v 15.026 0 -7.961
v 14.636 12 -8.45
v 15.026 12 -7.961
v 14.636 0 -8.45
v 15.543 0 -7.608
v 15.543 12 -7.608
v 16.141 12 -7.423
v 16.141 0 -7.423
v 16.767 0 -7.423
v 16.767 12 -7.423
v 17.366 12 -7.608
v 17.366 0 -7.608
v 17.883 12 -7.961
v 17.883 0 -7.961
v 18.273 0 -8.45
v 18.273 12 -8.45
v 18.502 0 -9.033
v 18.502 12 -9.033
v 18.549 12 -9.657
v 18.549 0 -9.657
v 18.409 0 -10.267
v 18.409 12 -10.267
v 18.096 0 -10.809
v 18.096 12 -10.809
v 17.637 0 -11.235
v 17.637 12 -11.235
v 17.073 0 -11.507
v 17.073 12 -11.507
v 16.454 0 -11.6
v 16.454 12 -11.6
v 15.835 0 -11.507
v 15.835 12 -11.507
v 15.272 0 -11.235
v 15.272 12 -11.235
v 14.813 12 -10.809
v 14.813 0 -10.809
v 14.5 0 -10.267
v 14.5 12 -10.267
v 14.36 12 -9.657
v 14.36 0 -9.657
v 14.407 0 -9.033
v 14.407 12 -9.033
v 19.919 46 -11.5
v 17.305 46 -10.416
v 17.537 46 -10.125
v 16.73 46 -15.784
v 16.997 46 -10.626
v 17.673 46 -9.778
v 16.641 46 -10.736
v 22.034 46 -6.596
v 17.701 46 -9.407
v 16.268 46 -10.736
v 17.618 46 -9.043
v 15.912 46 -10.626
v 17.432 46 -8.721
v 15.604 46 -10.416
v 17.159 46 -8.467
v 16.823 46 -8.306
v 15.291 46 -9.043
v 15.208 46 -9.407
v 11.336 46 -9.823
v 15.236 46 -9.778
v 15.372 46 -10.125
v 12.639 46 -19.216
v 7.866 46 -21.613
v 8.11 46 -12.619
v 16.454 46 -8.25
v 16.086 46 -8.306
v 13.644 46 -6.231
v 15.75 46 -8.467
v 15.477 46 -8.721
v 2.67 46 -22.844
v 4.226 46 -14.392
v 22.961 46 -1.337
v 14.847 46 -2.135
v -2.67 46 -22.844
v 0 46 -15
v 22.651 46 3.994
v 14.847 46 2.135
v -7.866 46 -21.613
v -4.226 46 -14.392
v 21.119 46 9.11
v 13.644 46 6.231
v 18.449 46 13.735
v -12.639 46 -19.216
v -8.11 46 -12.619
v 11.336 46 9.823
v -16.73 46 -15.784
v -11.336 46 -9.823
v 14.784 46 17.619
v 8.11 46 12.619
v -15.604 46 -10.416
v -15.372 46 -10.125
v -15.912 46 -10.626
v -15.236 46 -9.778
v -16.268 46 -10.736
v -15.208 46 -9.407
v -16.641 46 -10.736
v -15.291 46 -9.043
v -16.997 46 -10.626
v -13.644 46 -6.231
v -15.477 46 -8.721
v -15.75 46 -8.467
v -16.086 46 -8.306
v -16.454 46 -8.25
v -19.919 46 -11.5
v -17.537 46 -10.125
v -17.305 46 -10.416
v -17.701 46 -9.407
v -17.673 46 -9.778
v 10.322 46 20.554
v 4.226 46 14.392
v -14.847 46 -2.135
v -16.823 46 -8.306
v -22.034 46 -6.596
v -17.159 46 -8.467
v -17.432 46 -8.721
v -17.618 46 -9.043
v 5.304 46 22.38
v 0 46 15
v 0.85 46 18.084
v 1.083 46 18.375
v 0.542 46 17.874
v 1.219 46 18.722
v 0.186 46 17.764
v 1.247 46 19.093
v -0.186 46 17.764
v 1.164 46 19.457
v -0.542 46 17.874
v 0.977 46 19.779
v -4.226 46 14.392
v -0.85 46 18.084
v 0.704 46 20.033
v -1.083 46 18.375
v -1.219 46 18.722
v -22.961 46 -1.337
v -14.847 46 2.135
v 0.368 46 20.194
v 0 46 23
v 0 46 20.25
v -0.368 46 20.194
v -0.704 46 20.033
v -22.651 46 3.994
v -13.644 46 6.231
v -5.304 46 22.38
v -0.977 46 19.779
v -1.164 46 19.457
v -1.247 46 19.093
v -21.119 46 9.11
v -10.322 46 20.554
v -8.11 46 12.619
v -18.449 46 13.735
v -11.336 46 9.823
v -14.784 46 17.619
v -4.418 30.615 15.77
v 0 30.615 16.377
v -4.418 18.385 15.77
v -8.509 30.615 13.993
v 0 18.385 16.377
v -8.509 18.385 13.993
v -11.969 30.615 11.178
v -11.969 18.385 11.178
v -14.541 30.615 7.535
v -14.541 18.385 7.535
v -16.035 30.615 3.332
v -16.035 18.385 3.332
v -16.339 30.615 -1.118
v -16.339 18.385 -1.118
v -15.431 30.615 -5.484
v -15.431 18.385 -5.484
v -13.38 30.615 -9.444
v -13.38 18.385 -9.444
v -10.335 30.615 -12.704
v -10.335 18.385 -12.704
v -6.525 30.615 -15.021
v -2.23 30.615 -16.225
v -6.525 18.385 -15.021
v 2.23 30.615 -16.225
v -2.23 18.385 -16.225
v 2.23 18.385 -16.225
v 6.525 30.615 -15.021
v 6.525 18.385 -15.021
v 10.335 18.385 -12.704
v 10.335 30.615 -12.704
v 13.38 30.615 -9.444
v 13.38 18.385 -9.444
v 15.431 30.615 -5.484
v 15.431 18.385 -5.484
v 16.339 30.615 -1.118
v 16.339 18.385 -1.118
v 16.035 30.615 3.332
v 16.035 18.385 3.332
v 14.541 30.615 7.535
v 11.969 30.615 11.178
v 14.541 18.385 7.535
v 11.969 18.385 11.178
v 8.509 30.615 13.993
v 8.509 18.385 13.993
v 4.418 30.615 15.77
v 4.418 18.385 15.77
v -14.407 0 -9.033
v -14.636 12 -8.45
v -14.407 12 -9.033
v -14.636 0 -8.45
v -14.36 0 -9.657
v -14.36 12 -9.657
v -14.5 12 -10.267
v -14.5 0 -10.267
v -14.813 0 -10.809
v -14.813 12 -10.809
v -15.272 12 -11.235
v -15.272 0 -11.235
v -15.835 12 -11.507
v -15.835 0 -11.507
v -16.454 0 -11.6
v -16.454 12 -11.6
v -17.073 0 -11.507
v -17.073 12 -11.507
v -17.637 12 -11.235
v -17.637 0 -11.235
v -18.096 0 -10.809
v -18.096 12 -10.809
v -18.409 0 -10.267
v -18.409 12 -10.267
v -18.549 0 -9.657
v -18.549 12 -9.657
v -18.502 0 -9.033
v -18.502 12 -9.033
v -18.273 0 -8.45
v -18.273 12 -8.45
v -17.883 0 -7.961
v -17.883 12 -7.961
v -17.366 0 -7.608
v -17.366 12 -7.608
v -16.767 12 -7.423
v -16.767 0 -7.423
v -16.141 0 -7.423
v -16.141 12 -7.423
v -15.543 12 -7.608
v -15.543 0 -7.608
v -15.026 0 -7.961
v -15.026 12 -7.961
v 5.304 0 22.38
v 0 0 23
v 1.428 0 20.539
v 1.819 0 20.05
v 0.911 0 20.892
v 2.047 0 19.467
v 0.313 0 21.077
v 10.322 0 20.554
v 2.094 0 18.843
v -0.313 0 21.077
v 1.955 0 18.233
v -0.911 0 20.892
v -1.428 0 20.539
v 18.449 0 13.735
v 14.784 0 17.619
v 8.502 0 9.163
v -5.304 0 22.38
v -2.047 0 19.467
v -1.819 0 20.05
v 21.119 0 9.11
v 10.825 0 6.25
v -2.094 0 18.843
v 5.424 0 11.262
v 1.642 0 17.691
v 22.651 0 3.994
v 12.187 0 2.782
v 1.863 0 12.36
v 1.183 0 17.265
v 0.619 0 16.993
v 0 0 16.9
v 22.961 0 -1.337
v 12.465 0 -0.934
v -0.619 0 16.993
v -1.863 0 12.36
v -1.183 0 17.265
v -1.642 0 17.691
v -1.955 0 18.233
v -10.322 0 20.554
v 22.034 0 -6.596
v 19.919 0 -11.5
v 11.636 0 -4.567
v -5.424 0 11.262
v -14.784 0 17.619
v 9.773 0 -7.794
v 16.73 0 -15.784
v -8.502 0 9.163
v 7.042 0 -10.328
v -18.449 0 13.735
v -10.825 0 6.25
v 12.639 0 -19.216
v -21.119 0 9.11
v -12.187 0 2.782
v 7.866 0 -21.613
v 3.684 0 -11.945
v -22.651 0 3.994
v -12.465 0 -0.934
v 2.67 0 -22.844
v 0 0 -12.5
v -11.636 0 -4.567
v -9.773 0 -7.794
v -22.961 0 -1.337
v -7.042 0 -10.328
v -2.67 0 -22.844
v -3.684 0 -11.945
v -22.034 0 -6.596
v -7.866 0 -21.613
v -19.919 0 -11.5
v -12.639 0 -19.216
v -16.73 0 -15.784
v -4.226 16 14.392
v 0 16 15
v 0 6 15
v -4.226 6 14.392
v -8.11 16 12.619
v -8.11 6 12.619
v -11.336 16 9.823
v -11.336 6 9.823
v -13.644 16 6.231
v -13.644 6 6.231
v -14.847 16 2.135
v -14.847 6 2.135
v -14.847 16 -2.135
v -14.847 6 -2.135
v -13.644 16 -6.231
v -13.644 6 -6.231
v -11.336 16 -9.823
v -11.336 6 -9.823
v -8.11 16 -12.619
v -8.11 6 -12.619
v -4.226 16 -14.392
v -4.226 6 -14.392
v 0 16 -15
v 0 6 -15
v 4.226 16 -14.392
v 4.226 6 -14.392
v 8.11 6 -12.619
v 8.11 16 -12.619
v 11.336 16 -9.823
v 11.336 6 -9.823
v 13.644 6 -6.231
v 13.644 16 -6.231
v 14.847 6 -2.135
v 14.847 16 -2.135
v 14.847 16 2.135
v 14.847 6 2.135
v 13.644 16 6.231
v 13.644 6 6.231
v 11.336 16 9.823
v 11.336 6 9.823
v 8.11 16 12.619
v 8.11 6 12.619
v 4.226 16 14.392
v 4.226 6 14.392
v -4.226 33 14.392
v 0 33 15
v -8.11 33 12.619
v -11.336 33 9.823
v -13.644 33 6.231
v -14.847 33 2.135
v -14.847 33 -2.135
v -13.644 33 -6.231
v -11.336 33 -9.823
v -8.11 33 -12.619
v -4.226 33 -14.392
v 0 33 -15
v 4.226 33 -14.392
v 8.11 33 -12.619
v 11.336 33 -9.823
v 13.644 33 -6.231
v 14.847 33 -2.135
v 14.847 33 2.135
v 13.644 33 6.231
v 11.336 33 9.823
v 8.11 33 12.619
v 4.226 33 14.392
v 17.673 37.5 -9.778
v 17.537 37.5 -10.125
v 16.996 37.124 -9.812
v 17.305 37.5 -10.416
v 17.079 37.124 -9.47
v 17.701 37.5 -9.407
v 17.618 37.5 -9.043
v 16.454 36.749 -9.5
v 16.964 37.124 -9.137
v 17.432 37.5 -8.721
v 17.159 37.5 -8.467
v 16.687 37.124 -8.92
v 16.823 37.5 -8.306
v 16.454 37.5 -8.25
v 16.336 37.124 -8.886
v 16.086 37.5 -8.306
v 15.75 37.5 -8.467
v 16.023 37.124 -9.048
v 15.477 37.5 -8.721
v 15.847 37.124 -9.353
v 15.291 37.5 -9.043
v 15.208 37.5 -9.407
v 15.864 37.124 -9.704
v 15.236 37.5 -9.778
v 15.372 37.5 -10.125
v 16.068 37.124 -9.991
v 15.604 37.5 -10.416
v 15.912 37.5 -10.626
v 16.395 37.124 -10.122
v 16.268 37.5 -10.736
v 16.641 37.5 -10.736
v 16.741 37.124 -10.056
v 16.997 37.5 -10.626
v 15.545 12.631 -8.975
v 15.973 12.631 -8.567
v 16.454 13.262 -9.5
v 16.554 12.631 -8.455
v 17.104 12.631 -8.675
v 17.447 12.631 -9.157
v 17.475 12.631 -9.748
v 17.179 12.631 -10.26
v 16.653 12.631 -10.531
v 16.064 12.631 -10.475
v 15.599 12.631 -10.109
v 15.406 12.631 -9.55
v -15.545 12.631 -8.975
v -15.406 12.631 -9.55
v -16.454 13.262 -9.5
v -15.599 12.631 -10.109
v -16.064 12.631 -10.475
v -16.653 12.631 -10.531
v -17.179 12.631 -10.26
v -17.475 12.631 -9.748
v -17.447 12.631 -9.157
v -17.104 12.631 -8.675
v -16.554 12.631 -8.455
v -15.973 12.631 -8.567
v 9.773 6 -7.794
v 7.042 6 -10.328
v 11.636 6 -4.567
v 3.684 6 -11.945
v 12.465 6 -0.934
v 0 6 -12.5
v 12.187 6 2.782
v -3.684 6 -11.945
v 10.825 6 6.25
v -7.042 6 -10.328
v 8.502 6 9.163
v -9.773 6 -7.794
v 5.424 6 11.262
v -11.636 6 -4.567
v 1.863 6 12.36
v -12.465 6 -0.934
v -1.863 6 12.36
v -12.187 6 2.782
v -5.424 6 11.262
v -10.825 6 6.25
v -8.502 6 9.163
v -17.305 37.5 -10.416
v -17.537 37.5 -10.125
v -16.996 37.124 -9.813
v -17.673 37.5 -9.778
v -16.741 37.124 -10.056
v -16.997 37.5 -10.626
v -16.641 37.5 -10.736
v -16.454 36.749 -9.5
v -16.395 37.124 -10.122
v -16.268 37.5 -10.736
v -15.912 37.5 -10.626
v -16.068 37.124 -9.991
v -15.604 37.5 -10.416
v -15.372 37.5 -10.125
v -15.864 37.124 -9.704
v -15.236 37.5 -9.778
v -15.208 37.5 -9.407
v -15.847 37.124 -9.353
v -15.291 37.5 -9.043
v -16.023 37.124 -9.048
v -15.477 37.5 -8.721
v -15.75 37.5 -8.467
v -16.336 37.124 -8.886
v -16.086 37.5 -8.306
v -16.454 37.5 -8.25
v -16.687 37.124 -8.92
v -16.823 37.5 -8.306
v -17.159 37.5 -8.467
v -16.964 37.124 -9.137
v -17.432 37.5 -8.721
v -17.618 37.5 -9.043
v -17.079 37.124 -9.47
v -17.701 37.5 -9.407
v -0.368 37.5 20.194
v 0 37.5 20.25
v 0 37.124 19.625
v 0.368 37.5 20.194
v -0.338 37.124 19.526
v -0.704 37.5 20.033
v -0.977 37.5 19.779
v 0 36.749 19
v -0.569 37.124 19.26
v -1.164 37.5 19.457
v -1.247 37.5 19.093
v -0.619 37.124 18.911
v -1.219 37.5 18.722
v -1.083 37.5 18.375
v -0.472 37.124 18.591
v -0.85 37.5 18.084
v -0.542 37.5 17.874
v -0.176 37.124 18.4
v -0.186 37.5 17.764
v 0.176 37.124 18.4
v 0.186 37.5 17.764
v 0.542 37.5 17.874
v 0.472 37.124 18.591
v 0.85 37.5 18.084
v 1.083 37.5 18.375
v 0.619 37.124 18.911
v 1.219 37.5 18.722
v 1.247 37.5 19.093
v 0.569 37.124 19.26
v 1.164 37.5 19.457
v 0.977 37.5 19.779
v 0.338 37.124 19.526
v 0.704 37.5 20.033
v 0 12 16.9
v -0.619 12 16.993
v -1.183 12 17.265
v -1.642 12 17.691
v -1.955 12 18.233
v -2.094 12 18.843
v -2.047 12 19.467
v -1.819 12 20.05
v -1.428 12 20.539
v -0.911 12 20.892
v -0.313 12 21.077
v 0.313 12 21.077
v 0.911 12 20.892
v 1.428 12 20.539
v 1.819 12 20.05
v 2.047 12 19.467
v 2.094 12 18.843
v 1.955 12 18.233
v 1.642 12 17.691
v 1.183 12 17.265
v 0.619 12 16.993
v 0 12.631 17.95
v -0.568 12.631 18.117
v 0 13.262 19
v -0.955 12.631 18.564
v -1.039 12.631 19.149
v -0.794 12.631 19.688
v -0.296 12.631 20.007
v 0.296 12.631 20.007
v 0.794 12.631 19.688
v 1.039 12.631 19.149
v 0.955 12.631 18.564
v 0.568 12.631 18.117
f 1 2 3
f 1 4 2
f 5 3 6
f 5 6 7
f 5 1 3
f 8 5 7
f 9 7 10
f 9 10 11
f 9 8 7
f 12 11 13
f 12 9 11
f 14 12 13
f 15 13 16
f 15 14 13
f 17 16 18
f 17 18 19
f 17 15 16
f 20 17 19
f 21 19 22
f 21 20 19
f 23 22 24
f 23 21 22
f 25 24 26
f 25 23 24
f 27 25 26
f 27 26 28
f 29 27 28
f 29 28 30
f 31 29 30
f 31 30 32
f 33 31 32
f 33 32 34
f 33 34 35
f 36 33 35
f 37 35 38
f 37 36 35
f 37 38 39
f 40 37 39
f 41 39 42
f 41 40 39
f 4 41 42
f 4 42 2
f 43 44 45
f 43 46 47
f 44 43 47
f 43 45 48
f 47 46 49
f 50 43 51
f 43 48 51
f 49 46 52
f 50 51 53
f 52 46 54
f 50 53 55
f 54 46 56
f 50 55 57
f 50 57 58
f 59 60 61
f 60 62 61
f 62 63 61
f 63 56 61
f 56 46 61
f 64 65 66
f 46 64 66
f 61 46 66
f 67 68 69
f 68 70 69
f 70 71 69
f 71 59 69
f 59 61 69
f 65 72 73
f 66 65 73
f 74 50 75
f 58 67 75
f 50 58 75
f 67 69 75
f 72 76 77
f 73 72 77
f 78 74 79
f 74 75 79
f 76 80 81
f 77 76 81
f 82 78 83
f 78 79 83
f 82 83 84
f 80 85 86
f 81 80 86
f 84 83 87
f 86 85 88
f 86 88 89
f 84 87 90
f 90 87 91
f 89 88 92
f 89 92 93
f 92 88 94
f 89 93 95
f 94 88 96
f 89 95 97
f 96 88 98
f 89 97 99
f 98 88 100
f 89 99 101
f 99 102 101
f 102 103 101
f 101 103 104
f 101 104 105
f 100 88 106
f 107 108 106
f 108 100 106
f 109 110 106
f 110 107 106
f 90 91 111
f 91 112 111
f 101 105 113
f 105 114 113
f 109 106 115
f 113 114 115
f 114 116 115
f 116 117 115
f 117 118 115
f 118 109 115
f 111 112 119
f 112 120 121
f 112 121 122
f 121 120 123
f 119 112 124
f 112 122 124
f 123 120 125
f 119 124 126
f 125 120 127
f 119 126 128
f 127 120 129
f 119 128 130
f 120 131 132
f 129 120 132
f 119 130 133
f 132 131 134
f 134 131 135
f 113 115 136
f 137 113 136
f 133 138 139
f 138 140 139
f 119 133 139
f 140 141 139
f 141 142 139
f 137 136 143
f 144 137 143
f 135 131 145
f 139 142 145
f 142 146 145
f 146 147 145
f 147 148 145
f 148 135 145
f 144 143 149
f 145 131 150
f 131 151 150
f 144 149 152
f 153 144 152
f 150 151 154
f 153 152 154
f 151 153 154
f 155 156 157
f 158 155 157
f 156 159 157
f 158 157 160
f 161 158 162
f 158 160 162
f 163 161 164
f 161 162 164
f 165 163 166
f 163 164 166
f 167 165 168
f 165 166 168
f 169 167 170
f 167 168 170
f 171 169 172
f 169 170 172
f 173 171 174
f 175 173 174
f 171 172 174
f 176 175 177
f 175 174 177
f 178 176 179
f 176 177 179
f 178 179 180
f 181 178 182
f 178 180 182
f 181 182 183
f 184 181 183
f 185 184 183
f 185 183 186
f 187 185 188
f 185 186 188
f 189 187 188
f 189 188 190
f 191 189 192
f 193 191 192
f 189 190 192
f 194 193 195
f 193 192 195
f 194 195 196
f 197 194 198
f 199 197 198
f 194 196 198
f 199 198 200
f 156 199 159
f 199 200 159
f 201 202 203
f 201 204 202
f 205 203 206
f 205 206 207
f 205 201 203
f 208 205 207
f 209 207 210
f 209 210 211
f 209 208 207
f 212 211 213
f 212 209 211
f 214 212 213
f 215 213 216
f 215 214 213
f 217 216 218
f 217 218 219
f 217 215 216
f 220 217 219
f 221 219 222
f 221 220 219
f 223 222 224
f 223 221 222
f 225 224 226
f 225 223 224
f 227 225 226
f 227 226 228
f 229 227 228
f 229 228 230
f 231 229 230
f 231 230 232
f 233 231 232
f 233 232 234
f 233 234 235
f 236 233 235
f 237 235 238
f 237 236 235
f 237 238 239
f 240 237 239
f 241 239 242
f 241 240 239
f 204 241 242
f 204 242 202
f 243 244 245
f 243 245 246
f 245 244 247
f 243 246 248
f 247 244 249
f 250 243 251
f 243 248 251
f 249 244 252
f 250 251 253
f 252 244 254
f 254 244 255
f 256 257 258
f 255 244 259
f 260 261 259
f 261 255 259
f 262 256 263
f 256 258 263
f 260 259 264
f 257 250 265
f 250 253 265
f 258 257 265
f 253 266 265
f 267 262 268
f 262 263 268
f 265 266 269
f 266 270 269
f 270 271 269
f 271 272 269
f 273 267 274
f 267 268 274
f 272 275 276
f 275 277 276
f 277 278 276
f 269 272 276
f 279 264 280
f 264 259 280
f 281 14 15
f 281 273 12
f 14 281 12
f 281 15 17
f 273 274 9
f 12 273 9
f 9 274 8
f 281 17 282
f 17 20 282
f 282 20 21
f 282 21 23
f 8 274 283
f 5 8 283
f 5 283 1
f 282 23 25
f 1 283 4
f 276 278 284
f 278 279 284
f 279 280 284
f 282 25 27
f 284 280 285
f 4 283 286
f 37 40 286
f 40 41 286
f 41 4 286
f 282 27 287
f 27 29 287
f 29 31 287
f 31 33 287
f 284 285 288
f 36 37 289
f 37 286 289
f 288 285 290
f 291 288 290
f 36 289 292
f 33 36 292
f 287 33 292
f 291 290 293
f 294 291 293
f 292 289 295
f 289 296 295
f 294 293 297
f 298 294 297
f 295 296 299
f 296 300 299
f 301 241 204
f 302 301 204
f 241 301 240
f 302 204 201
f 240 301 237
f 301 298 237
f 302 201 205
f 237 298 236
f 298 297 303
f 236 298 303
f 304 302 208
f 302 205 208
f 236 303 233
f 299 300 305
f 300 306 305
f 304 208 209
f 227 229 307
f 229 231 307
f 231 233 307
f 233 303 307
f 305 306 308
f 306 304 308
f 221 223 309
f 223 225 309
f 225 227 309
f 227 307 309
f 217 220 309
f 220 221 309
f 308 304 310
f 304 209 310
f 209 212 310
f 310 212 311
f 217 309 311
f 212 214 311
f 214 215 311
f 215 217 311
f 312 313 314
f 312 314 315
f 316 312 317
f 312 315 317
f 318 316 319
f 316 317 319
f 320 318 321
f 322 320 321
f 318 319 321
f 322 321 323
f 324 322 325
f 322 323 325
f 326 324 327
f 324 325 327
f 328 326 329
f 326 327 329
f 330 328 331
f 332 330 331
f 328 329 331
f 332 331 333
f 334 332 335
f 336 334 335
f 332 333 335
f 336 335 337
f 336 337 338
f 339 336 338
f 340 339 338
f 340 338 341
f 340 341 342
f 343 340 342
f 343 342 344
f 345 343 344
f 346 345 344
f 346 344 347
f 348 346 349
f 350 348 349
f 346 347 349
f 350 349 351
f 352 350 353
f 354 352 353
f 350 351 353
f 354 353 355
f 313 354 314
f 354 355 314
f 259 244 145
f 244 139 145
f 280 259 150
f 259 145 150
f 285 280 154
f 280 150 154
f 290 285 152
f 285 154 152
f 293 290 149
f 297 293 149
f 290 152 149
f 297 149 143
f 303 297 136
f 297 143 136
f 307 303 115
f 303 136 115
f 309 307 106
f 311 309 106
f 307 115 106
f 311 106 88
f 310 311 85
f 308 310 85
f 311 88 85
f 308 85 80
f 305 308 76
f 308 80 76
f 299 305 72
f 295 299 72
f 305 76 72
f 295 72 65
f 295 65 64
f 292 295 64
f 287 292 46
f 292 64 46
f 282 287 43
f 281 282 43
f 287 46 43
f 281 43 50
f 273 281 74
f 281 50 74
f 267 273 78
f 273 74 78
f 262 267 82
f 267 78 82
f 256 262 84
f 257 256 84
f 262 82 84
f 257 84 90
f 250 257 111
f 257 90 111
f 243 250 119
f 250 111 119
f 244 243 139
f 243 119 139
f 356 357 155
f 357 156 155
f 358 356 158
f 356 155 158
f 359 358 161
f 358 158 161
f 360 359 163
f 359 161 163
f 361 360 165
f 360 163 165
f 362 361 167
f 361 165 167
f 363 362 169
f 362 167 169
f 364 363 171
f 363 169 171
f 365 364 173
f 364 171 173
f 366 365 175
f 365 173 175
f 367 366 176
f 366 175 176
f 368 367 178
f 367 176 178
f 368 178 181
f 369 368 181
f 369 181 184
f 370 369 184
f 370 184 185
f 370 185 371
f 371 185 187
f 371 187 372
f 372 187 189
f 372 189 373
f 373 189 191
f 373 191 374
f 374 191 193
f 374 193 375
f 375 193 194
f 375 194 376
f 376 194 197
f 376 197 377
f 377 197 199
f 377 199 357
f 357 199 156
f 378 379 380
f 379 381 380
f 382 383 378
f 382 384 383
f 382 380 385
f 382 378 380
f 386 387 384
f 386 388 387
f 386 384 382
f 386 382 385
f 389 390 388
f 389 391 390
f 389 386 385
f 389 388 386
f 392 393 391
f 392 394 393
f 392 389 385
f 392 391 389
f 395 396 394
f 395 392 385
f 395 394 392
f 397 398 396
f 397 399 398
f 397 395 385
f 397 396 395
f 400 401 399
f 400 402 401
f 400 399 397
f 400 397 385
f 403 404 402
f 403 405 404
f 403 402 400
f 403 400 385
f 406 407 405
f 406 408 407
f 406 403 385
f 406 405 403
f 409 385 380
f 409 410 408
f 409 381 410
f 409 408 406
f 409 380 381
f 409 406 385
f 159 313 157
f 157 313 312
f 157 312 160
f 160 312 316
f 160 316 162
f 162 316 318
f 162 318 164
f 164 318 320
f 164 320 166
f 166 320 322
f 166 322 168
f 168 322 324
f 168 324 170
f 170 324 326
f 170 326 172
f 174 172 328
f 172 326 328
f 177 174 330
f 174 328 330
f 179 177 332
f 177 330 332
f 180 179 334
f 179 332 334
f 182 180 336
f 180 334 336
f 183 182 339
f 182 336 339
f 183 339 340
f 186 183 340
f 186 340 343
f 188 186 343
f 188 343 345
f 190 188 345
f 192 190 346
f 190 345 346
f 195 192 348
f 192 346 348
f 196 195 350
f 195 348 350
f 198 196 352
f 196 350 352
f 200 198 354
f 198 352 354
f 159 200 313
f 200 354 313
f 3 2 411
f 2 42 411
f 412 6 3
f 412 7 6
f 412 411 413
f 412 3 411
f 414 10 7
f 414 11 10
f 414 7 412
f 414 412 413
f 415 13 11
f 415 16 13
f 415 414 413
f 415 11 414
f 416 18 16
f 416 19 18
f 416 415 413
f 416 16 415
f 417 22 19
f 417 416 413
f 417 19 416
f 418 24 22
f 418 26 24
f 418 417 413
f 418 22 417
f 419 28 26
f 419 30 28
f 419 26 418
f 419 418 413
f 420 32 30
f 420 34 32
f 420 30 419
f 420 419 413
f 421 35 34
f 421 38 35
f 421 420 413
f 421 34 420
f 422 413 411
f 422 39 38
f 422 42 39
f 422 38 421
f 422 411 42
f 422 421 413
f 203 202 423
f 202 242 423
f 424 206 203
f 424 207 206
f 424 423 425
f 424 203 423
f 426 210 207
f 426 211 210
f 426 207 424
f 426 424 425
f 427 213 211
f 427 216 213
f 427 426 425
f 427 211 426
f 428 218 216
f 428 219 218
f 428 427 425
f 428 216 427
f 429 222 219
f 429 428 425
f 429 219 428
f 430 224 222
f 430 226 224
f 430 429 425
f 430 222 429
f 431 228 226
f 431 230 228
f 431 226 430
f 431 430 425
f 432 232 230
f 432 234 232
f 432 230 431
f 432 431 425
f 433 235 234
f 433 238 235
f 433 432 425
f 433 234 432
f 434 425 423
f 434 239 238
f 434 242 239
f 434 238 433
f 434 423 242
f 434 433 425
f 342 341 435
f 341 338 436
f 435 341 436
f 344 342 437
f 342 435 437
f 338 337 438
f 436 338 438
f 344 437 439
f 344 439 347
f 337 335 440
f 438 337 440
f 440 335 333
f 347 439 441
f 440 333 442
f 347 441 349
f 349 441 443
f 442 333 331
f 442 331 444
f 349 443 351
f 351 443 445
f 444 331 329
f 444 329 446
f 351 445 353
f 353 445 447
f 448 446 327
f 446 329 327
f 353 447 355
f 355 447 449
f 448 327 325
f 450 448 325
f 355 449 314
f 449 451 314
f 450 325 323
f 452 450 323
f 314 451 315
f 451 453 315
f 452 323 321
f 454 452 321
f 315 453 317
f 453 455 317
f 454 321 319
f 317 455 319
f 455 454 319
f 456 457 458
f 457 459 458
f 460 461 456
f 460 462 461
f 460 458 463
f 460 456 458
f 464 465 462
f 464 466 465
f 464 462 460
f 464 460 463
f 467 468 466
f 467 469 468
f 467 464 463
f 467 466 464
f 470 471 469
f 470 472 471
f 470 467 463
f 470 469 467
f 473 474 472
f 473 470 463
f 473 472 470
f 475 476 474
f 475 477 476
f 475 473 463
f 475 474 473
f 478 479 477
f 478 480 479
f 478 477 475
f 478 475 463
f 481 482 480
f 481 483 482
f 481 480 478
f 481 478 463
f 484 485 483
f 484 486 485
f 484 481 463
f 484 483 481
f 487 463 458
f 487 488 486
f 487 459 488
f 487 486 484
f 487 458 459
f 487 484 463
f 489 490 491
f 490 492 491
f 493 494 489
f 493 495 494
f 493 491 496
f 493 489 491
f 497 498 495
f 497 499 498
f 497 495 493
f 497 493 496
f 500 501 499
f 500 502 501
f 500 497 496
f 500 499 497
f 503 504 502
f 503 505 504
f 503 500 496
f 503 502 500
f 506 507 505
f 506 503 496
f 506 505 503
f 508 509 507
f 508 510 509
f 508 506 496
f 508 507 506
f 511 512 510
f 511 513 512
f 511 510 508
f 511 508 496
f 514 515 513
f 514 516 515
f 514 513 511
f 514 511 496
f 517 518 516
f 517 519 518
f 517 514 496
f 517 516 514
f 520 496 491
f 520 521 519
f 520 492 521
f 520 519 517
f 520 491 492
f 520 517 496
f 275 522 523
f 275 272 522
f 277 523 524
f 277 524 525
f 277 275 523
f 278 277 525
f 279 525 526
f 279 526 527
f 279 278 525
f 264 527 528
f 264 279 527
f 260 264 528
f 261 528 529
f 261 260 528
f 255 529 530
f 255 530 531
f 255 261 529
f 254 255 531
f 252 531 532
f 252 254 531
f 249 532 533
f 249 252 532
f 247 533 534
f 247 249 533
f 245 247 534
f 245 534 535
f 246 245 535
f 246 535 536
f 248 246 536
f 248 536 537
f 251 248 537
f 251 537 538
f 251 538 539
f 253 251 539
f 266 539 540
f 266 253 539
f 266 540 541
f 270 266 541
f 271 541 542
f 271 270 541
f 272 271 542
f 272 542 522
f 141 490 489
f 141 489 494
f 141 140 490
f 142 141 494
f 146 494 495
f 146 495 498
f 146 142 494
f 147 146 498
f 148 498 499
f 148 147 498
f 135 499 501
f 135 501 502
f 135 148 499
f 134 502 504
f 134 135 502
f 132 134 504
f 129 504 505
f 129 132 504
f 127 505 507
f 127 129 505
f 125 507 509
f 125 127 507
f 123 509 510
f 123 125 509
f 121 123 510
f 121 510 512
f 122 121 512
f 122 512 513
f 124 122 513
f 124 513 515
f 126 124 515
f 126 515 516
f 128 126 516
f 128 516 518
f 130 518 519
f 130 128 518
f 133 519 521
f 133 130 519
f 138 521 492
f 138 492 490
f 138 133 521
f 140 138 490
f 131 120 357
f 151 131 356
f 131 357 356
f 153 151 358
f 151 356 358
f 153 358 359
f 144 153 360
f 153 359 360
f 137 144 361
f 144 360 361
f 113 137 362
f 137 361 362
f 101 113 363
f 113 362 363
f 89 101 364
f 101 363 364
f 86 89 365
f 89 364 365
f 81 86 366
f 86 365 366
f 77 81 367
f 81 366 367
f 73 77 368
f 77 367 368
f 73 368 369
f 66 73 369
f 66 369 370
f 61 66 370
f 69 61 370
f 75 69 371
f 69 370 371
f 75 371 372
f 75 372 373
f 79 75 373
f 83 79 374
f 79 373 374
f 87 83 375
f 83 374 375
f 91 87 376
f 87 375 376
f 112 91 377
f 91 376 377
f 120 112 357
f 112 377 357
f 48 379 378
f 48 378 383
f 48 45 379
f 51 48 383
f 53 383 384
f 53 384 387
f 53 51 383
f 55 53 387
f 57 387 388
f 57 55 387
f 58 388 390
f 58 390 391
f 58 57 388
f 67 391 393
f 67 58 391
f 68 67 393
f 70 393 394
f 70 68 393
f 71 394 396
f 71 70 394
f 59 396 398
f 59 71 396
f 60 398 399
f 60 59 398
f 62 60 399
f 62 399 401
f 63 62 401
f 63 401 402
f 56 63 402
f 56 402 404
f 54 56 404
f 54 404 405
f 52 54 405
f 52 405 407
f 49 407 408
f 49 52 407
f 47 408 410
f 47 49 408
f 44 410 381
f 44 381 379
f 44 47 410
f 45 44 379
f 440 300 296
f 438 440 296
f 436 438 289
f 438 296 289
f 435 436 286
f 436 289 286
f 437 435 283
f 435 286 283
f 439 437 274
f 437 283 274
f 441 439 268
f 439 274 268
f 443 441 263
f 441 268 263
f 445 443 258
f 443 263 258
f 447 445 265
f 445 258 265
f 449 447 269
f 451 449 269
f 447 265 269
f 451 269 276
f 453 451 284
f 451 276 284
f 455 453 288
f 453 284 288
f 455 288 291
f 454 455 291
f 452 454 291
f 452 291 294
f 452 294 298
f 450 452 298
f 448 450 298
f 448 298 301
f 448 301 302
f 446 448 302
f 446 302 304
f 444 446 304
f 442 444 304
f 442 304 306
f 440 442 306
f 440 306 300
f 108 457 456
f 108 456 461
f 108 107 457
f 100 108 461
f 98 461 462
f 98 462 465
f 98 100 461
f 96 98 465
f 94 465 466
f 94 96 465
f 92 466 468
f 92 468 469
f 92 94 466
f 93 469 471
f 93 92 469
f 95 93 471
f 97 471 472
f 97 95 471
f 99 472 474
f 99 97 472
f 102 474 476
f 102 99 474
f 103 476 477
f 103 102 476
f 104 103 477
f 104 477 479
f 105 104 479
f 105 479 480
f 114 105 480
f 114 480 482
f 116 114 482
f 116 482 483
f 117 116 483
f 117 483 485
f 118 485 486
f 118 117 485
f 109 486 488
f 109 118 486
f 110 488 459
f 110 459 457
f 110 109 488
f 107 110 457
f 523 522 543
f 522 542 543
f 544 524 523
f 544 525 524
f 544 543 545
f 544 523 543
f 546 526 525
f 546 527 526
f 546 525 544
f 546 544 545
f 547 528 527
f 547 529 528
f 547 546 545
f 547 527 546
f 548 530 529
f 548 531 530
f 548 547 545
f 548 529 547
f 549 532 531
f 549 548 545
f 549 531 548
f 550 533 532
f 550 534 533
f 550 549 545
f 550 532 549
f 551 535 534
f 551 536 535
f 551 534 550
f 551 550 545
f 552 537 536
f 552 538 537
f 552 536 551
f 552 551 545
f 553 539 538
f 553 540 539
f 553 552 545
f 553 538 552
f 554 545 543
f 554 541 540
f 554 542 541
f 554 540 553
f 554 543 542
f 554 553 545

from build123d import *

# Parameters (mm, degrees)
ESQUISSE2_R                  = 12.5
ENL_V_MAT_EXTRU_1_DEPTH      = 47
R_P_TITION_CIRCULAIRE1_COUNT = 3
R_P_TITION_CIRCULAIRE2_COUNT = 3


with BuildPart() as part:
    # Esquisse1 → Révolution1 (revolve)
    with BuildSketch(Plane.XY, mode=Mode.PRIVATE) as r_volution1_sk:
        Polygon((0, 0), (23, 0), (23, 46), (15, 46), (15, 33), (16.37708167, 30.614824582), (16.37708167, 18.385175418), (15, 16), (15, 6), (0, 6), align=None)
    revolve(r_volution1_sk.sketch.rotate(Axis((0, 6, 0), (0, -1, 0)), 90), axis=Axis((0, 6, 0), (0, -1, 0)))  # turned: the seam where the file's is

    # Esquisse2 → Enlèv. mat.-Extru.1 (cut, through all)
    with BuildSketch(Plane.XZ):
        with Locations(Location((0, 0, 0), (0, 0, 270))):  # turned: the seam where the file's is
            Circle(ESQUISSE2_R)
    extrude(amount=-ENL_V_MAT_EXTRU_1_DEPTH, mode=Mode.SUBTRACT)

    # Esquisse3 → Trou taraudé M51 (revolve, cut)
    with BuildSketch(Plane(origin=(0, 0, 19), x_dir=(0, 0, -1), z_dir=(1, 0, 0))):
        Polygon((0, 0), (0, 13.2618073), (2.1, 12), (2.1, 0), align=None)
    trou_taraud_m51 = revolve(axis=Axis((0, -6.35, 19), (0, 1, 0)), mode=Mode.SUBTRACT)

    # Répétition circulaire1: Trou taraudé M51 ×3 about axis
    r_p_tition_circulaire1_axis = Axis((0, 0, 0), (0, 1, 0))
    for i in range(1, R_P_TITION_CIRCULAIRE1_COUNT):
        add(trou_taraud_m51.rotate(r_p_tition_circulaire1_axis, i * 360 / R_P_TITION_CIRCULAIRE1_COUNT), mode=Mode.SUBTRACT)

    # Esquisse7 → Trou taraudé M31 (revolve, cut)
    with BuildSketch(Plane(origin=(0, 46, 19), x_dir=(0, 0, 1), z_dir=(1, 0, 0))):
        Polygon((0, 0), (0, 9.251075774), (1.25, 8.5), (1.25, 0), align=None)
    trou_taraud_m31 = revolve(axis=Axis((0, 52.35, 19), (0, -1, 0)), mode=Mode.SUBTRACT)

    # Répétition circulaire2: Trou taraudé M31 ×3 about axis
    r_p_tition_circulaire2_axis = Axis((0, 0, 0), (0, 1, 0))
    for i in range(1, R_P_TITION_CIRCULAIRE2_COUNT):
        add(trou_taraud_m31.rotate(r_p_tition_circulaire2_axis, i * 360 / R_P_TITION_CIRCULAIRE2_COUNT), mode=Mode.SUBTRACT)


solid = part.part
